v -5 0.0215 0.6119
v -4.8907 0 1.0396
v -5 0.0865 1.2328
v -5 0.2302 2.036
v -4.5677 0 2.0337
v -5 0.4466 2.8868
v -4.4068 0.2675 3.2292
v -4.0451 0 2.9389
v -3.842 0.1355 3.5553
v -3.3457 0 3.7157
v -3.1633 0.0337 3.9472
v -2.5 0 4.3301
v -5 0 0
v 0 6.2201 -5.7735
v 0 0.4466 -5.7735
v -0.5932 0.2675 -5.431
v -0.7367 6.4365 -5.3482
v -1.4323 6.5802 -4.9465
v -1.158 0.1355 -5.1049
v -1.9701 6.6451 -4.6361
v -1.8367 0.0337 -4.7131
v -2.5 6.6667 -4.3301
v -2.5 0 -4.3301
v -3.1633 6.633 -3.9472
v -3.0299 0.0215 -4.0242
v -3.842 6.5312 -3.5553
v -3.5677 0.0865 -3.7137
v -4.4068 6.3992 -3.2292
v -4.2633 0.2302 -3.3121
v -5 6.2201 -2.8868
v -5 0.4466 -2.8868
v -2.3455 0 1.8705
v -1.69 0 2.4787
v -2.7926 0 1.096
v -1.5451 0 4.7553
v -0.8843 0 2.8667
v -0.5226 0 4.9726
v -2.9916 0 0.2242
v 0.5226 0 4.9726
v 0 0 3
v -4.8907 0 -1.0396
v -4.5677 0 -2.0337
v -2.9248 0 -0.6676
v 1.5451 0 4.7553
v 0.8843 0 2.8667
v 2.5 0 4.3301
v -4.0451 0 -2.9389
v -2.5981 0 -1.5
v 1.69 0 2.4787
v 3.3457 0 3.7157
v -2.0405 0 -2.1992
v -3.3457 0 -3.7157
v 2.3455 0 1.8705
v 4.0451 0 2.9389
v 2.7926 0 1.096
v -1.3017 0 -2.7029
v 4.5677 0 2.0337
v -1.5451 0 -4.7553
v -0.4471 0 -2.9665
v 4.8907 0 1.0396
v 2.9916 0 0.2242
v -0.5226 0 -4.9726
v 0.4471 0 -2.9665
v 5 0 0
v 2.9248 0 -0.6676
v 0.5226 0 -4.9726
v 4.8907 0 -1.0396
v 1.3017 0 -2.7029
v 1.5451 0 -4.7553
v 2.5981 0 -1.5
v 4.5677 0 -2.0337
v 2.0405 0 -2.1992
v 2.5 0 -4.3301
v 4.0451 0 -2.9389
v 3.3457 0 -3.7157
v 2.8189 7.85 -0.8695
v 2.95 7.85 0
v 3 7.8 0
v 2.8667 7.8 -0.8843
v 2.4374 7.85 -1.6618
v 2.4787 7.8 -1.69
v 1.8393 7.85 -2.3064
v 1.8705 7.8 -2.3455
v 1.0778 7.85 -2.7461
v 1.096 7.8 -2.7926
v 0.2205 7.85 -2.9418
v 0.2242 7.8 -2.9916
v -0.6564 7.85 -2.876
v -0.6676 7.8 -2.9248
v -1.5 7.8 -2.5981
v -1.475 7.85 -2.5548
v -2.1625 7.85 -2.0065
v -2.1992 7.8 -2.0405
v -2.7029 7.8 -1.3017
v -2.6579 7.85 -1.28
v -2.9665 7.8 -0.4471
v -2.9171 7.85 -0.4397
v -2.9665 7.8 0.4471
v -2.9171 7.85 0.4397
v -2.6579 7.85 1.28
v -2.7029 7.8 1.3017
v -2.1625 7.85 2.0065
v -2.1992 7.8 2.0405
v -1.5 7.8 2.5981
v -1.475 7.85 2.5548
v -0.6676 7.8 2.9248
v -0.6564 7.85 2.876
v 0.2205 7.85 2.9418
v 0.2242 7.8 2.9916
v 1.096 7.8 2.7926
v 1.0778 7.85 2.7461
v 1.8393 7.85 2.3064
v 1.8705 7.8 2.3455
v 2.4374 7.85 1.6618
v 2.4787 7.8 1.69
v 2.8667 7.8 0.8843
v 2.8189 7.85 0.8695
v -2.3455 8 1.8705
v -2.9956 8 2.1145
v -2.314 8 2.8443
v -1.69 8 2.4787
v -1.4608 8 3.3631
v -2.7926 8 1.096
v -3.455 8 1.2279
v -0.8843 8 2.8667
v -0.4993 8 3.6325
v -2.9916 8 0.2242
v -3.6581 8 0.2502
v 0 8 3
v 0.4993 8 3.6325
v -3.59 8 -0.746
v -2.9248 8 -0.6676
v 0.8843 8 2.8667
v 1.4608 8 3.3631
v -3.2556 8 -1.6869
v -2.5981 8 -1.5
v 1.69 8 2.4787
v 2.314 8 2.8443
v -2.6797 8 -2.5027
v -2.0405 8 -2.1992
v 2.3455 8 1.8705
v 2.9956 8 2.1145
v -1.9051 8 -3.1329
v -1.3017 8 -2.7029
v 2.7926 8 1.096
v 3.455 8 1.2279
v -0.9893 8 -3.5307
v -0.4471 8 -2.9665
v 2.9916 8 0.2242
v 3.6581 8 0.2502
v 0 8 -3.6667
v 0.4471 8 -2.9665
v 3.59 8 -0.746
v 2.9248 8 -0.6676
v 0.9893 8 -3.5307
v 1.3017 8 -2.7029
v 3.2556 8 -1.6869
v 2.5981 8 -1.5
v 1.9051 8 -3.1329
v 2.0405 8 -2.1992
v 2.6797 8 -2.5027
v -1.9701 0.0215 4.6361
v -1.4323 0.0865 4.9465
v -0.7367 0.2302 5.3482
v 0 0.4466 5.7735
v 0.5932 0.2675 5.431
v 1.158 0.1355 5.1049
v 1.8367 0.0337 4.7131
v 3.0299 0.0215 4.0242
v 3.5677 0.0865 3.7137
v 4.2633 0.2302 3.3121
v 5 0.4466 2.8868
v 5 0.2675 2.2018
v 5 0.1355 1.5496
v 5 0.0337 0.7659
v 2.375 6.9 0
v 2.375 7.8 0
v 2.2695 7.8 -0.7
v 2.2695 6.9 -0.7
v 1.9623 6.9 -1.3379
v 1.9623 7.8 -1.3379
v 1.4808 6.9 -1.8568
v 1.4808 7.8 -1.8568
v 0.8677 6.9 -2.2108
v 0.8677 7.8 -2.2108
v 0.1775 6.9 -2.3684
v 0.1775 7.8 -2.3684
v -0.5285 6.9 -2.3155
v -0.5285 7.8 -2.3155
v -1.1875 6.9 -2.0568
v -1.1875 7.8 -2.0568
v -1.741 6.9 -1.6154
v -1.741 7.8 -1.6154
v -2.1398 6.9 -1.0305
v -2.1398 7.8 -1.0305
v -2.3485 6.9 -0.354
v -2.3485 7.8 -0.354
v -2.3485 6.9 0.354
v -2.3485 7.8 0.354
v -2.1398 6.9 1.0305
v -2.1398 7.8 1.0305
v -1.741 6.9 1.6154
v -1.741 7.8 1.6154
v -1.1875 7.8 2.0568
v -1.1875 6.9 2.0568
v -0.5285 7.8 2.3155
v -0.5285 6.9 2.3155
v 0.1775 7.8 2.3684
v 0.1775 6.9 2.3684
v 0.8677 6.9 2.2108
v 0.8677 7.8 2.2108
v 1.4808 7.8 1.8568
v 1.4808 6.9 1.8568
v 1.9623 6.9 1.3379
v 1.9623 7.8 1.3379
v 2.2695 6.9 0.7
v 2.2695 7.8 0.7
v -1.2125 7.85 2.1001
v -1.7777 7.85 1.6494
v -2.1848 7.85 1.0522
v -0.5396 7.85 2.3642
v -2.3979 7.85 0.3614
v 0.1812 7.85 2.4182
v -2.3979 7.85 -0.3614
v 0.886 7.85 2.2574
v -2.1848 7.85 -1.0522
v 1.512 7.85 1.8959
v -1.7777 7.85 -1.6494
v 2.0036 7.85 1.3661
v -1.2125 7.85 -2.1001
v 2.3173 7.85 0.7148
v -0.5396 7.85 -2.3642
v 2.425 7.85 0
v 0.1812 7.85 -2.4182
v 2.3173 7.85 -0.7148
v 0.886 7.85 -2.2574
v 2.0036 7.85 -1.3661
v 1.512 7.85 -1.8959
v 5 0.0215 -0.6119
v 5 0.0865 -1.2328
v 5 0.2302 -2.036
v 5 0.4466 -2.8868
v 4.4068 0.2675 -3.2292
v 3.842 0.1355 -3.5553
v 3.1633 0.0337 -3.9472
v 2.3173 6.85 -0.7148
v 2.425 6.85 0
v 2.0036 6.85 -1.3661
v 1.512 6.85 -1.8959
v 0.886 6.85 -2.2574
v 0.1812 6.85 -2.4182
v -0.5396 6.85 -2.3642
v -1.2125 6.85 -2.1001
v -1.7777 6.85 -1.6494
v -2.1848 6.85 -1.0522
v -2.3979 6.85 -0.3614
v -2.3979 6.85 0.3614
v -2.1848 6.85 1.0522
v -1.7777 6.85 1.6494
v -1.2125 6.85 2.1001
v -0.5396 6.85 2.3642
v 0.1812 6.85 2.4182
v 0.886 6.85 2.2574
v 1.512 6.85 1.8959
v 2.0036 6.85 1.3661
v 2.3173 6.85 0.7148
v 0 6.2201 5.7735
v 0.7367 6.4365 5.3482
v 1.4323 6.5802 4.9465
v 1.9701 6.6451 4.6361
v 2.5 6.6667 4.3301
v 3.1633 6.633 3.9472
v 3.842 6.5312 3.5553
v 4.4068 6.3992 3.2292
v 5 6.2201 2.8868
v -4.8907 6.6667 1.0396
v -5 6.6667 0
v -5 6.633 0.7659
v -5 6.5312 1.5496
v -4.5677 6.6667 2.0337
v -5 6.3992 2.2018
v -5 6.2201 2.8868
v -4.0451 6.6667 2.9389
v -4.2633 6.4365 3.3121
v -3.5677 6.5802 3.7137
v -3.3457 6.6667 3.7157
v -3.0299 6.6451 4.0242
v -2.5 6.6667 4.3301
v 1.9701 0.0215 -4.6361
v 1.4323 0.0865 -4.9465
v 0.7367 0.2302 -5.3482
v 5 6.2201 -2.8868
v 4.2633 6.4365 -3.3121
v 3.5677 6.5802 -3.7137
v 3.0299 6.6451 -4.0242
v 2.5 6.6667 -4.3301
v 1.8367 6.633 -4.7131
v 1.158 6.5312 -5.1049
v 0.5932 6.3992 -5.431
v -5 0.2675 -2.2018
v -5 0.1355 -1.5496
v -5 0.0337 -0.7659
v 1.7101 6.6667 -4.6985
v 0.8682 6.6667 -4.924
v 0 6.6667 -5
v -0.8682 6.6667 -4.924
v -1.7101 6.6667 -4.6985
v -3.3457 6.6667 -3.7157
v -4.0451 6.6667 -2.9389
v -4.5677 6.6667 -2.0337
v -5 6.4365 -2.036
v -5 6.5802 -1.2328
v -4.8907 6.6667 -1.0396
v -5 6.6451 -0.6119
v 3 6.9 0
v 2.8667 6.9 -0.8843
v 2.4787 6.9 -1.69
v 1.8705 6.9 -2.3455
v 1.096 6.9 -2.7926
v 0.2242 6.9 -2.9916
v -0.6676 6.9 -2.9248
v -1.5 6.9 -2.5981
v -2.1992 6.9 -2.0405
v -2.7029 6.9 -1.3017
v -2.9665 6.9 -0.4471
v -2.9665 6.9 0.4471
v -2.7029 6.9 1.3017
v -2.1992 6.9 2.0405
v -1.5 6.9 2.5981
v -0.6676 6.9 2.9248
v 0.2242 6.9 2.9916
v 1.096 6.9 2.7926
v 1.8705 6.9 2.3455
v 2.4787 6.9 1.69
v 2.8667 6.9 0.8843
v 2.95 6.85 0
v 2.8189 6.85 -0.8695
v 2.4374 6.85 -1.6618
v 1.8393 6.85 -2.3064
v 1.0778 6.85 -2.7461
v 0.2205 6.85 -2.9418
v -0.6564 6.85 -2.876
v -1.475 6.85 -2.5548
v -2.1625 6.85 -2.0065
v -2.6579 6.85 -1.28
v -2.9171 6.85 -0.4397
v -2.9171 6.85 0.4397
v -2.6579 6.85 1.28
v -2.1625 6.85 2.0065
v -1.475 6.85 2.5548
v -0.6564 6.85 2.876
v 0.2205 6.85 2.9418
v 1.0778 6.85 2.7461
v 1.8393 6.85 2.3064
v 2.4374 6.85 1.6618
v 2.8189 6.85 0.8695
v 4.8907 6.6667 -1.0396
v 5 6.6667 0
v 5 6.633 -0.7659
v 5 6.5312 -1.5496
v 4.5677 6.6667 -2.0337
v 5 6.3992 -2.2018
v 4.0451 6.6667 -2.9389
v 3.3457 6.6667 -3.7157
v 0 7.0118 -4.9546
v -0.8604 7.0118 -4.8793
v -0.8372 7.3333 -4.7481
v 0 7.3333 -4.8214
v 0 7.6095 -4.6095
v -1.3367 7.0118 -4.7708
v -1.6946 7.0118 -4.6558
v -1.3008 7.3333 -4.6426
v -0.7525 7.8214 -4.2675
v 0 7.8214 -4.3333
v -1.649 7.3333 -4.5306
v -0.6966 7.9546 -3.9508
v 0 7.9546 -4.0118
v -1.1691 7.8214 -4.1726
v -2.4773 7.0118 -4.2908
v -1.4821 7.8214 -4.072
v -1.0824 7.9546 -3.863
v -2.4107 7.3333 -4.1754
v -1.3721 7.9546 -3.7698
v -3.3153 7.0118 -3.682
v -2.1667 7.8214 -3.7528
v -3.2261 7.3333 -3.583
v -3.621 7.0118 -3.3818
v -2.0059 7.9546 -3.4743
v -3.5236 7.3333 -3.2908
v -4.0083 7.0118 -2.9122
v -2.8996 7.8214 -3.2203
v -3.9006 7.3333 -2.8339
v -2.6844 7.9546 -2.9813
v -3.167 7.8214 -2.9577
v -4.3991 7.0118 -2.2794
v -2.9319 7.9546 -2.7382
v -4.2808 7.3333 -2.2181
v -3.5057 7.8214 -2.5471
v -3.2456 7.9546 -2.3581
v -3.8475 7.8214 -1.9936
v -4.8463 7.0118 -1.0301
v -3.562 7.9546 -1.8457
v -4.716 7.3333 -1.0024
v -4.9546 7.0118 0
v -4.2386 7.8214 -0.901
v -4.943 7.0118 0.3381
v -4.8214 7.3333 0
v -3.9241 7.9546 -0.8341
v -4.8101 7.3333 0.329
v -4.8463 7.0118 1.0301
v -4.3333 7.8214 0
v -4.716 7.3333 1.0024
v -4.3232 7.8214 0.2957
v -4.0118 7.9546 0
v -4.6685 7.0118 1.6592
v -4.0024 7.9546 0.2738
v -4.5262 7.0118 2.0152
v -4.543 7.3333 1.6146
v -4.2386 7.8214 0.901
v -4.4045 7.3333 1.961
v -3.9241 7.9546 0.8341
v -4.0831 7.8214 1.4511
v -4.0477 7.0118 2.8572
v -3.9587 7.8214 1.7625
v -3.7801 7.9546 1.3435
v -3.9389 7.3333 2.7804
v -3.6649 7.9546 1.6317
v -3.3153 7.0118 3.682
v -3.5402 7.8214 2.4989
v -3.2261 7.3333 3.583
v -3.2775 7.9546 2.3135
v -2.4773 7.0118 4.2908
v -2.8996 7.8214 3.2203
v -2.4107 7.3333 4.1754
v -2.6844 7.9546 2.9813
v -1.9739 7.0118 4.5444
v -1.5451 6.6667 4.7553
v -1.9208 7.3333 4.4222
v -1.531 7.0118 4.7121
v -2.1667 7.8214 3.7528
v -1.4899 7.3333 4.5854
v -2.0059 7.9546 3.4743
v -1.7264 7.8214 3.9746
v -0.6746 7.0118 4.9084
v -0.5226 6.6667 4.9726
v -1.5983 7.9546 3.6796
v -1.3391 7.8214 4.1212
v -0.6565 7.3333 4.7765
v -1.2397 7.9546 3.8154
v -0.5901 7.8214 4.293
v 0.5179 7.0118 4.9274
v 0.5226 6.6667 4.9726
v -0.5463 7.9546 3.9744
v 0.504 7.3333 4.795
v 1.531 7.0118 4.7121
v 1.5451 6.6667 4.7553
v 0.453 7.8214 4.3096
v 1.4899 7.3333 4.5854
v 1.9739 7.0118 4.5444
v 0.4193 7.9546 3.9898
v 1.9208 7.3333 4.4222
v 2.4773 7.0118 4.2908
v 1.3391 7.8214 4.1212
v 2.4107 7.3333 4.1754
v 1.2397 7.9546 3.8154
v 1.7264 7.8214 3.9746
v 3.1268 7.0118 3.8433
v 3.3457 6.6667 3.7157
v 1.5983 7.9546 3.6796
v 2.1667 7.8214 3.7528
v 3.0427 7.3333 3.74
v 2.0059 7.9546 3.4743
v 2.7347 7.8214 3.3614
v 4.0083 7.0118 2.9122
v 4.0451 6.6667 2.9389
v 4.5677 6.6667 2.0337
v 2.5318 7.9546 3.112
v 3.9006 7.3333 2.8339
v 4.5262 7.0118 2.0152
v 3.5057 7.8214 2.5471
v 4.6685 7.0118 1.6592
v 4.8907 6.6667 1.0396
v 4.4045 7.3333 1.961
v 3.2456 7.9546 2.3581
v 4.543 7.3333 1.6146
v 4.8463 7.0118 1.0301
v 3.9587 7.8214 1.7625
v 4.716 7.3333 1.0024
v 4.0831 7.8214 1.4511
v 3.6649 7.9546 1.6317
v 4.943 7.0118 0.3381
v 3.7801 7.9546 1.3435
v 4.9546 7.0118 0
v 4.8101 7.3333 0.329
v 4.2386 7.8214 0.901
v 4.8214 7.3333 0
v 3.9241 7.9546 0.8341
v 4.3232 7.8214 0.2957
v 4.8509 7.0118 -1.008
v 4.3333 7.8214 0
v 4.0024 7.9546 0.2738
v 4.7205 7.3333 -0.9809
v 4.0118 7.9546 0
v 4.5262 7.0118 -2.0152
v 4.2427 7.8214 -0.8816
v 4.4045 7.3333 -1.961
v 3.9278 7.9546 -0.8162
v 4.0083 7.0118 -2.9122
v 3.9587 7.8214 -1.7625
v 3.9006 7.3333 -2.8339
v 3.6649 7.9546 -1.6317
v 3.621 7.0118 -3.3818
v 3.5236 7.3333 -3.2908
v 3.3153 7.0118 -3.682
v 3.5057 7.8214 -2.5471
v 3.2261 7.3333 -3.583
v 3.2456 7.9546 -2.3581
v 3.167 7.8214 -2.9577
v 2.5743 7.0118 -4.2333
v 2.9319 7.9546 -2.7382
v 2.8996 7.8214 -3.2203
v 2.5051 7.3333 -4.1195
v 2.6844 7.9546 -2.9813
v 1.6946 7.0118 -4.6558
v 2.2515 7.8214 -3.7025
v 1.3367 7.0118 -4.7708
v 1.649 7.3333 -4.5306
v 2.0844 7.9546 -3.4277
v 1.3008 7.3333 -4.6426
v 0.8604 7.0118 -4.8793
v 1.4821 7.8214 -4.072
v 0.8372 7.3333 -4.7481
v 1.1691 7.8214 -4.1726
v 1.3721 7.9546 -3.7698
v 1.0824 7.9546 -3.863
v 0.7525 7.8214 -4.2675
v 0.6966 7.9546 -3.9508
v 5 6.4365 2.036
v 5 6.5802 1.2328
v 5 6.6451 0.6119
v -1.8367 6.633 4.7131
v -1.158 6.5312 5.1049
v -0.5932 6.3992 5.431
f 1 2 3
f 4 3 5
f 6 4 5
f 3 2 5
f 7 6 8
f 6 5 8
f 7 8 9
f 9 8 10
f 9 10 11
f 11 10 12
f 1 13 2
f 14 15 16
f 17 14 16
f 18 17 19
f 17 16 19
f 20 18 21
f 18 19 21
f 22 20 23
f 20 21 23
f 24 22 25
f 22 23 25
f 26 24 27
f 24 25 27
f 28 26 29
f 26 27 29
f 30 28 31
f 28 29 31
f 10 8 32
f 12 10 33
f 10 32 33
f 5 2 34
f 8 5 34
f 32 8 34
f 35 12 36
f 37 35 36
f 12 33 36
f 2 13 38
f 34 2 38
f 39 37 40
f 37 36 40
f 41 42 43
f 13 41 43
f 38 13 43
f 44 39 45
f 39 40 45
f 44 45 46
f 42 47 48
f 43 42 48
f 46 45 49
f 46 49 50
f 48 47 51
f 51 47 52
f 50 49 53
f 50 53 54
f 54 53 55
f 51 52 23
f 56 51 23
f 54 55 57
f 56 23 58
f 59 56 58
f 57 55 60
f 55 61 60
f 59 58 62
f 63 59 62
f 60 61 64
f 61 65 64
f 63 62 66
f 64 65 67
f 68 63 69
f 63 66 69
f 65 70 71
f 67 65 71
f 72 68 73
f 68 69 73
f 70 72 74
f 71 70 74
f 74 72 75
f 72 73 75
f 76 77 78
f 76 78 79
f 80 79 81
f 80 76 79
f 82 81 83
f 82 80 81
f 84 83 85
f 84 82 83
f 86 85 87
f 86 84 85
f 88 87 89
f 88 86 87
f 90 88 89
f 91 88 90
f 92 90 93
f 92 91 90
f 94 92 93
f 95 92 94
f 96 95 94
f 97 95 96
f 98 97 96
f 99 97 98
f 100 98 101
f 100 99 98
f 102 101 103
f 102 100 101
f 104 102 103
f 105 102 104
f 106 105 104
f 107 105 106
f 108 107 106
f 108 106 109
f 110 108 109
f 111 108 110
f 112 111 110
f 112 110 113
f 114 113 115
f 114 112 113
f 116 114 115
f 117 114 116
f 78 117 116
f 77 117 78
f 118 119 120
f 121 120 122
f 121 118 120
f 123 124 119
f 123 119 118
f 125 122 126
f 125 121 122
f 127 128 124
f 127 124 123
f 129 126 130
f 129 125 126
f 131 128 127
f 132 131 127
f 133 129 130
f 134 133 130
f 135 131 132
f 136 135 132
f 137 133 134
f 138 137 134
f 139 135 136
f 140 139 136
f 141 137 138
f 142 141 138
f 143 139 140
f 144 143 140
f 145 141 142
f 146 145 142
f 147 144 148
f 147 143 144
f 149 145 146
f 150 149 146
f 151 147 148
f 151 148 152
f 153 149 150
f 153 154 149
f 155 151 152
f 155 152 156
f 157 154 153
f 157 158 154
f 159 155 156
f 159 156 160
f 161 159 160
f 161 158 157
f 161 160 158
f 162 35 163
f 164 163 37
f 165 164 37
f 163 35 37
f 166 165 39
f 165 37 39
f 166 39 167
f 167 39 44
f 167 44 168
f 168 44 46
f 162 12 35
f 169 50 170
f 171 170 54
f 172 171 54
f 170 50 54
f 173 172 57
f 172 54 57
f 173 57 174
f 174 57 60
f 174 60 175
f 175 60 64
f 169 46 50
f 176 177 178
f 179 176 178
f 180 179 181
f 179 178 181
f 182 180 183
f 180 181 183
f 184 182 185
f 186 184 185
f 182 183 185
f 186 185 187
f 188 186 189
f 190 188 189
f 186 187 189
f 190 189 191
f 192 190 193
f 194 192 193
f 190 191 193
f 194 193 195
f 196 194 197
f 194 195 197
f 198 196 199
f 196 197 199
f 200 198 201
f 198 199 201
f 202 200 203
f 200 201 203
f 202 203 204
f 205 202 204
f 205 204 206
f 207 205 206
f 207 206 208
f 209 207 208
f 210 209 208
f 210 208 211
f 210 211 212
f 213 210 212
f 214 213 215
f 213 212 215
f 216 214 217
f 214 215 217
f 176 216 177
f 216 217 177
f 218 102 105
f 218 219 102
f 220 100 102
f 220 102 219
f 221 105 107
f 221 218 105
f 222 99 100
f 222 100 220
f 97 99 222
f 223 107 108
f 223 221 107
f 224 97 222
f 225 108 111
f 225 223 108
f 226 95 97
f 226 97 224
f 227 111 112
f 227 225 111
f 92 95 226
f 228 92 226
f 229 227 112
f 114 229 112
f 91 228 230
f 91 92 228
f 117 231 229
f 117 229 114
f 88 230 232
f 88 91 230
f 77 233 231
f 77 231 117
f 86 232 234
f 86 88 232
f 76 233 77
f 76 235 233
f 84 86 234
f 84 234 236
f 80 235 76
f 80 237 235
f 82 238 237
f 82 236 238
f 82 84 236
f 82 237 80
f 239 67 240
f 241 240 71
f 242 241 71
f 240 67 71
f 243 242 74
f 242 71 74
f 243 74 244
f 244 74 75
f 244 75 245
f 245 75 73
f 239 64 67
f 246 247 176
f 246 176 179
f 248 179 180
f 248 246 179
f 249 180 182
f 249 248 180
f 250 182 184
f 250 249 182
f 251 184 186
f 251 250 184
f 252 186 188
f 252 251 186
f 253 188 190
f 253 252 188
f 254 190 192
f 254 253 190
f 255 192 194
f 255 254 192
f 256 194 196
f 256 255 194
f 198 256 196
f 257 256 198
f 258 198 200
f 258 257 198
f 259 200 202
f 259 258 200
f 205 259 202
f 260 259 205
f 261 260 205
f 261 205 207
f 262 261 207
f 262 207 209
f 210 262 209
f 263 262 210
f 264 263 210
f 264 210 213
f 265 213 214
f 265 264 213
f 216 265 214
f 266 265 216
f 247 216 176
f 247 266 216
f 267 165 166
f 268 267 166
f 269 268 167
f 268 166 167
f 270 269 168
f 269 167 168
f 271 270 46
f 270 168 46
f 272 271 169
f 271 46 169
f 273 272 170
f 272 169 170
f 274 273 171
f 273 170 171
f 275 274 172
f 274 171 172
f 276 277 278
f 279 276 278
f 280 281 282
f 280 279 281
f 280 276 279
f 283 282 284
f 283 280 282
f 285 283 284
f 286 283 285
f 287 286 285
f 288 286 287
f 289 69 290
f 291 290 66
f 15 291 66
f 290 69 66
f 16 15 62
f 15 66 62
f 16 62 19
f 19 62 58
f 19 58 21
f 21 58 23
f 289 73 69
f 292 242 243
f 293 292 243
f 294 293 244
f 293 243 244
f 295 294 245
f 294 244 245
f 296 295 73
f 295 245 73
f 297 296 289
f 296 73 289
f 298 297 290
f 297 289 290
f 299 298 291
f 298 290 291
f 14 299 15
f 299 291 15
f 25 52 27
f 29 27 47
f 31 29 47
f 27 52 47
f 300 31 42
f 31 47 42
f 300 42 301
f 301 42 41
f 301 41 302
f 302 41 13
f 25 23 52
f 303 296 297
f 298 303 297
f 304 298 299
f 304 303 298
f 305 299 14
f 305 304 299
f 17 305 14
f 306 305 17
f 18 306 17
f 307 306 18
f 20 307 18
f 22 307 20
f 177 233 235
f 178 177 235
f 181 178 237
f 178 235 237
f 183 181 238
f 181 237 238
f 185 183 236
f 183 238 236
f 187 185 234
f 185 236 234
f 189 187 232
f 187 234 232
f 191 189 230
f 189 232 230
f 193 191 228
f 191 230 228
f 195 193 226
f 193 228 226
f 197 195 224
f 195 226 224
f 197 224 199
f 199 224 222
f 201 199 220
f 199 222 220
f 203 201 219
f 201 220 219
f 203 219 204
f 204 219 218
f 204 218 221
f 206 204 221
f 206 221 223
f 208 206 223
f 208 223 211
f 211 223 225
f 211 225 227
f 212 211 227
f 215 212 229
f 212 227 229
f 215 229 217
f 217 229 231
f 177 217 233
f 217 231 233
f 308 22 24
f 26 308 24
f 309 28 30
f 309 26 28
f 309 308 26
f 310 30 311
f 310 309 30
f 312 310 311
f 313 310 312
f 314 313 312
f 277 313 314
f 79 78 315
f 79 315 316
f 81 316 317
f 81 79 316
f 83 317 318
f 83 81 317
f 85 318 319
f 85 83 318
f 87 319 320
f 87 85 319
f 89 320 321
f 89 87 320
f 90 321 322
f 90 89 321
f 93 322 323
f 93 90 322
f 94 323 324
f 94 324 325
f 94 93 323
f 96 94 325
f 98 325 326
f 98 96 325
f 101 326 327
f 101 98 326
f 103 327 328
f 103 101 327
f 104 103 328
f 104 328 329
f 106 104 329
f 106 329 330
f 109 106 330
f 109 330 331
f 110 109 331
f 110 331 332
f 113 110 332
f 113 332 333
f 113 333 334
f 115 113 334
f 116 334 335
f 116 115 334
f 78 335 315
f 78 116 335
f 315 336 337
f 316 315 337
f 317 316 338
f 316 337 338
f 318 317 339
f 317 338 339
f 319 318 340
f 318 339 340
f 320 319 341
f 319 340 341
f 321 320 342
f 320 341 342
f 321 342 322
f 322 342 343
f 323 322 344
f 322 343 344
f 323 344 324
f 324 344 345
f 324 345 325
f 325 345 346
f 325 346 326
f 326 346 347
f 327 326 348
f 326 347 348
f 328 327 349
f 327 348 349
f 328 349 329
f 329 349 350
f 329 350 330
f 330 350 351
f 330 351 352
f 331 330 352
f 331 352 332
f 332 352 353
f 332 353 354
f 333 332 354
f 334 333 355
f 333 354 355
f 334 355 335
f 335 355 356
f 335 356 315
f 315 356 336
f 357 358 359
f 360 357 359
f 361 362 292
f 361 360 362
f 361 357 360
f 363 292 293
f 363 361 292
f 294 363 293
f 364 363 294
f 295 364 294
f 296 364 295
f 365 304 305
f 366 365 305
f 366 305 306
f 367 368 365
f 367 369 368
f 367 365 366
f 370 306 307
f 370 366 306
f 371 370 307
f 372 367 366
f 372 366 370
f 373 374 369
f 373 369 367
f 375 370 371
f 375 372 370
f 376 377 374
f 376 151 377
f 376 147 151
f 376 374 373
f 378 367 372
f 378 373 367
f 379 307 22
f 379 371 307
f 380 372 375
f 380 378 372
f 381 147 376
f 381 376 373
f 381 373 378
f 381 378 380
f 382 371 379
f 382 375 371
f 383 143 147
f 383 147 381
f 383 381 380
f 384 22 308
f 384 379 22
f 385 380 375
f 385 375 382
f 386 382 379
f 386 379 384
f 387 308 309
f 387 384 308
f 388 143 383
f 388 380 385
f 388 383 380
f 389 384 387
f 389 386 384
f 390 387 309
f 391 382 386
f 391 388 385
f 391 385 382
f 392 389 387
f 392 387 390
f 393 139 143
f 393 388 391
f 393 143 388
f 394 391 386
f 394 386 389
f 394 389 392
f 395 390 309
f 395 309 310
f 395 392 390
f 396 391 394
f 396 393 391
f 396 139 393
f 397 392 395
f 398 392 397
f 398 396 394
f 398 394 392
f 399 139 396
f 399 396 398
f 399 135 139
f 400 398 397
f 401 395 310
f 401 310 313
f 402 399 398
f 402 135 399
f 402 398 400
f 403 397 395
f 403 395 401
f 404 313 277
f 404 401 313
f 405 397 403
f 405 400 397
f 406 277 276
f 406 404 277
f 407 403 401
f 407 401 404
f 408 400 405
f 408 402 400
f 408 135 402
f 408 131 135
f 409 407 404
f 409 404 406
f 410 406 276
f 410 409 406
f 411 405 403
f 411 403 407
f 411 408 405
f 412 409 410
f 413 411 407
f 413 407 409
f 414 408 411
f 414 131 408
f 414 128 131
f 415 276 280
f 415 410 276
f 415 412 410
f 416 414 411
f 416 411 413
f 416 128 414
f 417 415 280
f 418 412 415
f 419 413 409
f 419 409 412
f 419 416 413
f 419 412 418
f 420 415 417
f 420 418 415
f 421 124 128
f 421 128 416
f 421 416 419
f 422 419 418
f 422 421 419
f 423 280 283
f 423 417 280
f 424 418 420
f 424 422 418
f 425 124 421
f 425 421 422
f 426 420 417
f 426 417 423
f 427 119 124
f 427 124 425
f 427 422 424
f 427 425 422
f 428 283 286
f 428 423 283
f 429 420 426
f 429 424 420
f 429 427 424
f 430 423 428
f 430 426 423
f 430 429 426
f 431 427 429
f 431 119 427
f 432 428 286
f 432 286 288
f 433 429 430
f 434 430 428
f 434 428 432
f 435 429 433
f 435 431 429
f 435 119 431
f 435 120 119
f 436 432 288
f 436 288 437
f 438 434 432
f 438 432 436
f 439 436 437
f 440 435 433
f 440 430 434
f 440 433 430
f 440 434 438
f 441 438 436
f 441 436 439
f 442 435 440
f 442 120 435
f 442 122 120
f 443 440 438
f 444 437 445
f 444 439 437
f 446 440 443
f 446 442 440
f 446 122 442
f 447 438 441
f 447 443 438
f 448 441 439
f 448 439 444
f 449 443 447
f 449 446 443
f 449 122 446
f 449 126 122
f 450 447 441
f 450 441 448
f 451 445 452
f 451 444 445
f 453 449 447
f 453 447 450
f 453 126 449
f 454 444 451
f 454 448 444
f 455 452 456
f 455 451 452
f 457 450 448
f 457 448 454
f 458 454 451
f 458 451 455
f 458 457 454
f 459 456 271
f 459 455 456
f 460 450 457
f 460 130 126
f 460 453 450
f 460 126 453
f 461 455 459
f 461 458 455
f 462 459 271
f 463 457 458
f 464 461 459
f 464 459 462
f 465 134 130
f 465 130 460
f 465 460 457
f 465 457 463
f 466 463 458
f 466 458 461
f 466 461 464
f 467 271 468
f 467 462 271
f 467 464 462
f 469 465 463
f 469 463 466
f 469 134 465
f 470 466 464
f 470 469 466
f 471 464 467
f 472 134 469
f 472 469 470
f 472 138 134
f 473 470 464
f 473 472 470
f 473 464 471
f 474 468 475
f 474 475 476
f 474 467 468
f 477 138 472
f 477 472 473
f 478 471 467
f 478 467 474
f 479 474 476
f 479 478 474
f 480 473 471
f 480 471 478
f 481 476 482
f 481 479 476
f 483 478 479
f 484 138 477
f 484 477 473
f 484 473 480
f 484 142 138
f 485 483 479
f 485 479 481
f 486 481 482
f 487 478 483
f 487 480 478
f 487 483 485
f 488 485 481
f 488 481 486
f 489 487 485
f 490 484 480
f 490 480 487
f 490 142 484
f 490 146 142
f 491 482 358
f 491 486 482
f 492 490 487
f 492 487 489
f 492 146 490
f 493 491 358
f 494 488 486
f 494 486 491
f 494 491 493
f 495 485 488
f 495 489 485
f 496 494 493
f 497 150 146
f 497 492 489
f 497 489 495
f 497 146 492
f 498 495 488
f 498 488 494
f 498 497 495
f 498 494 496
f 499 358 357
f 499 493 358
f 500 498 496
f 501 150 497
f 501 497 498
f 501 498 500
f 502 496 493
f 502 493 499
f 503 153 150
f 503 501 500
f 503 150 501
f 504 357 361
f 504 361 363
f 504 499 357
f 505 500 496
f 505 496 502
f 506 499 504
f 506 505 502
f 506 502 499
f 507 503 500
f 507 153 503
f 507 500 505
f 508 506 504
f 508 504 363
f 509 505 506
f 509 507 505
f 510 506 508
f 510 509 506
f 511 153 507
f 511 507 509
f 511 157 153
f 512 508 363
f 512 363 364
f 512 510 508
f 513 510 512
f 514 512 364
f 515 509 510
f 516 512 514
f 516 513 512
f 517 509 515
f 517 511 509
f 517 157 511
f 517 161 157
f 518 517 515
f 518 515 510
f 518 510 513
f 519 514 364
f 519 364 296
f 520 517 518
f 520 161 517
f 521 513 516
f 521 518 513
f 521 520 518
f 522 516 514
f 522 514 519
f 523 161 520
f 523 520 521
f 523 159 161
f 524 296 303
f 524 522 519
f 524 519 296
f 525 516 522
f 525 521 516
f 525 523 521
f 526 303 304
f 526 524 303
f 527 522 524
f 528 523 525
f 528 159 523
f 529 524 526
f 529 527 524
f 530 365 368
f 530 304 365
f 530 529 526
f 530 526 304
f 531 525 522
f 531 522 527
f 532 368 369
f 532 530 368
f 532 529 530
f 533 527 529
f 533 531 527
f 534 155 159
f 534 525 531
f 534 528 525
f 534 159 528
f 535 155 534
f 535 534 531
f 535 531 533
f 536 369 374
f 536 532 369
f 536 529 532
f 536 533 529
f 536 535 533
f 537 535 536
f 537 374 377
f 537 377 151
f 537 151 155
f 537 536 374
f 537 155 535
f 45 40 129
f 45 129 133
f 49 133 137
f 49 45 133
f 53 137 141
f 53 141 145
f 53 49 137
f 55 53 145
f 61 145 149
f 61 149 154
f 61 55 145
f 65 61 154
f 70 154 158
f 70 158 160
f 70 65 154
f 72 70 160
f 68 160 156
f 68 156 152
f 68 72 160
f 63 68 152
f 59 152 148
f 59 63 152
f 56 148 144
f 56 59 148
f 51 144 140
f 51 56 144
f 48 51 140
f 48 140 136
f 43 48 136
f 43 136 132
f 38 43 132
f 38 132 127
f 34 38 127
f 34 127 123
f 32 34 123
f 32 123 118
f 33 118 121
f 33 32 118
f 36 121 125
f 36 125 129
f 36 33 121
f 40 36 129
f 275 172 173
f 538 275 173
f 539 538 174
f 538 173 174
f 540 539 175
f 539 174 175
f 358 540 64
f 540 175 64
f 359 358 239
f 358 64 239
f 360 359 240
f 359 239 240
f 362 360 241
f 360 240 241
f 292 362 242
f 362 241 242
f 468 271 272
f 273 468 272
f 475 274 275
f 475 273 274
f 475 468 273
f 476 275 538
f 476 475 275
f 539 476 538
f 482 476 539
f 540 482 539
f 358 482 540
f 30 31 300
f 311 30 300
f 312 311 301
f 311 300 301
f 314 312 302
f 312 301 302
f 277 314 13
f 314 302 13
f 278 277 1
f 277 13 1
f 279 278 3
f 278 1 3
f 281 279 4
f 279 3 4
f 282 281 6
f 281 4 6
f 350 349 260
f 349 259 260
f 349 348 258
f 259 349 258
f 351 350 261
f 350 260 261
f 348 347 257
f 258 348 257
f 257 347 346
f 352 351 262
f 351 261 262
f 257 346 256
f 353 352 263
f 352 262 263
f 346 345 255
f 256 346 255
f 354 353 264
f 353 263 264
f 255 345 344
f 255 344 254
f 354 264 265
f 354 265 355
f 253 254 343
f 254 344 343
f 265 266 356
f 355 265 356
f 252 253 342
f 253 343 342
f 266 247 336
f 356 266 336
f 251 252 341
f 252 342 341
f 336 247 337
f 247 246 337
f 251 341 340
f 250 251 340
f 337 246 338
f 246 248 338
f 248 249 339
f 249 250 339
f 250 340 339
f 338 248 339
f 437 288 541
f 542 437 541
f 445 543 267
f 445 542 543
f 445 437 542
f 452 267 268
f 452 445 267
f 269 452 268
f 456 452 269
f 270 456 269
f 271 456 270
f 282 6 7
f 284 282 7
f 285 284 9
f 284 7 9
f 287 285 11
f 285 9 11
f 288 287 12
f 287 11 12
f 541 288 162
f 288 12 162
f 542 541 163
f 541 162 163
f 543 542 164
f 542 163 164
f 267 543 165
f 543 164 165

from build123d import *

# Parameters (mm, degrees)
SKETCH1_R           = 3
EXTRUDE1_DEPTH      = 8
EXTRUDE_THIN1_START = -0.15
SKETCH3_R           = 3
SKETCH3_R_2         = 2.375
EXTRUDE_THIN1_DEPTH = 1
CHAMFER1_SIZE       = 0.05


with BuildPart() as part:
    # Sketch1 → Extrude1 (new body)
    with BuildSketch(Plane(origin=(0, 0, 0), x_dir=(1, 0, 0), z_dir=(0, 1, 0))):
        Polygon((0, 5.773502692), (-5, 2.886751346), (-5, -2.886751346), (0, -5.773502692), (5, -2.886751346), (5, 2.886751346), align=None)
        Circle(SKETCH1_R, mode=Mode.SUBTRACT)
    extrude(amount=EXTRUDE1_DEPTH)

    # Sketch2 → Cut-Revolve1 (revolve, cut)
    with BuildSketch(Plane(origin=(0, 0, 0), x_dir=(0, 0, -1), z_dir=(1, 0, 0))):
        with BuildLine():
            Line((5.773502692, 8), (5.773502692, 6.220084679))
            Line((5.773502692, 6.220084679), (5, 6.666666667))
            ThreePointArc((5, 6.666666667), (4.609475708, 7.609475708), (3.666666667, 8))
            Line((3.666666667, 8), (5.773502692, 8))
        make_face()
        Polygon((5.773502692, 0.446581987), (5, 0), (5.773502692, 0), align=None)
    revolve(axis=Axis((0, 0, 0), (0, 1, 0)), mode=Mode.SUBTRACT)


with BuildPart() as body_2:
    # Sketch3 → Extrude-Thin1 (new body)
    with BuildSketch(Plane(origin=(0, 8, 0), x_dir=(1, 0, 0), z_dir=(0, 1, 0)).offset(EXTRUDE_THIN1_START)):
        Circle(SKETCH3_R)
        Circle(SKETCH3_R_2, mode=Mode.SUBTRACT)
    extrude(amount=-EXTRUDE_THIN1_DEPTH)

    # Chamfer1
    chamfer1_edges = [body_2.edges().sort_by_distance(p)[0] for p in [
        (-3, 7.85, 0),
        (-2.375, 7.85, 0),
        (-3, 6.85, 0),
        (-2.375, 6.85, 0),
    ]]
    chamfer(chamfer1_edges, length=CHAMFER1_SIZE)


solid = Compound([part.part, body_2.part])
